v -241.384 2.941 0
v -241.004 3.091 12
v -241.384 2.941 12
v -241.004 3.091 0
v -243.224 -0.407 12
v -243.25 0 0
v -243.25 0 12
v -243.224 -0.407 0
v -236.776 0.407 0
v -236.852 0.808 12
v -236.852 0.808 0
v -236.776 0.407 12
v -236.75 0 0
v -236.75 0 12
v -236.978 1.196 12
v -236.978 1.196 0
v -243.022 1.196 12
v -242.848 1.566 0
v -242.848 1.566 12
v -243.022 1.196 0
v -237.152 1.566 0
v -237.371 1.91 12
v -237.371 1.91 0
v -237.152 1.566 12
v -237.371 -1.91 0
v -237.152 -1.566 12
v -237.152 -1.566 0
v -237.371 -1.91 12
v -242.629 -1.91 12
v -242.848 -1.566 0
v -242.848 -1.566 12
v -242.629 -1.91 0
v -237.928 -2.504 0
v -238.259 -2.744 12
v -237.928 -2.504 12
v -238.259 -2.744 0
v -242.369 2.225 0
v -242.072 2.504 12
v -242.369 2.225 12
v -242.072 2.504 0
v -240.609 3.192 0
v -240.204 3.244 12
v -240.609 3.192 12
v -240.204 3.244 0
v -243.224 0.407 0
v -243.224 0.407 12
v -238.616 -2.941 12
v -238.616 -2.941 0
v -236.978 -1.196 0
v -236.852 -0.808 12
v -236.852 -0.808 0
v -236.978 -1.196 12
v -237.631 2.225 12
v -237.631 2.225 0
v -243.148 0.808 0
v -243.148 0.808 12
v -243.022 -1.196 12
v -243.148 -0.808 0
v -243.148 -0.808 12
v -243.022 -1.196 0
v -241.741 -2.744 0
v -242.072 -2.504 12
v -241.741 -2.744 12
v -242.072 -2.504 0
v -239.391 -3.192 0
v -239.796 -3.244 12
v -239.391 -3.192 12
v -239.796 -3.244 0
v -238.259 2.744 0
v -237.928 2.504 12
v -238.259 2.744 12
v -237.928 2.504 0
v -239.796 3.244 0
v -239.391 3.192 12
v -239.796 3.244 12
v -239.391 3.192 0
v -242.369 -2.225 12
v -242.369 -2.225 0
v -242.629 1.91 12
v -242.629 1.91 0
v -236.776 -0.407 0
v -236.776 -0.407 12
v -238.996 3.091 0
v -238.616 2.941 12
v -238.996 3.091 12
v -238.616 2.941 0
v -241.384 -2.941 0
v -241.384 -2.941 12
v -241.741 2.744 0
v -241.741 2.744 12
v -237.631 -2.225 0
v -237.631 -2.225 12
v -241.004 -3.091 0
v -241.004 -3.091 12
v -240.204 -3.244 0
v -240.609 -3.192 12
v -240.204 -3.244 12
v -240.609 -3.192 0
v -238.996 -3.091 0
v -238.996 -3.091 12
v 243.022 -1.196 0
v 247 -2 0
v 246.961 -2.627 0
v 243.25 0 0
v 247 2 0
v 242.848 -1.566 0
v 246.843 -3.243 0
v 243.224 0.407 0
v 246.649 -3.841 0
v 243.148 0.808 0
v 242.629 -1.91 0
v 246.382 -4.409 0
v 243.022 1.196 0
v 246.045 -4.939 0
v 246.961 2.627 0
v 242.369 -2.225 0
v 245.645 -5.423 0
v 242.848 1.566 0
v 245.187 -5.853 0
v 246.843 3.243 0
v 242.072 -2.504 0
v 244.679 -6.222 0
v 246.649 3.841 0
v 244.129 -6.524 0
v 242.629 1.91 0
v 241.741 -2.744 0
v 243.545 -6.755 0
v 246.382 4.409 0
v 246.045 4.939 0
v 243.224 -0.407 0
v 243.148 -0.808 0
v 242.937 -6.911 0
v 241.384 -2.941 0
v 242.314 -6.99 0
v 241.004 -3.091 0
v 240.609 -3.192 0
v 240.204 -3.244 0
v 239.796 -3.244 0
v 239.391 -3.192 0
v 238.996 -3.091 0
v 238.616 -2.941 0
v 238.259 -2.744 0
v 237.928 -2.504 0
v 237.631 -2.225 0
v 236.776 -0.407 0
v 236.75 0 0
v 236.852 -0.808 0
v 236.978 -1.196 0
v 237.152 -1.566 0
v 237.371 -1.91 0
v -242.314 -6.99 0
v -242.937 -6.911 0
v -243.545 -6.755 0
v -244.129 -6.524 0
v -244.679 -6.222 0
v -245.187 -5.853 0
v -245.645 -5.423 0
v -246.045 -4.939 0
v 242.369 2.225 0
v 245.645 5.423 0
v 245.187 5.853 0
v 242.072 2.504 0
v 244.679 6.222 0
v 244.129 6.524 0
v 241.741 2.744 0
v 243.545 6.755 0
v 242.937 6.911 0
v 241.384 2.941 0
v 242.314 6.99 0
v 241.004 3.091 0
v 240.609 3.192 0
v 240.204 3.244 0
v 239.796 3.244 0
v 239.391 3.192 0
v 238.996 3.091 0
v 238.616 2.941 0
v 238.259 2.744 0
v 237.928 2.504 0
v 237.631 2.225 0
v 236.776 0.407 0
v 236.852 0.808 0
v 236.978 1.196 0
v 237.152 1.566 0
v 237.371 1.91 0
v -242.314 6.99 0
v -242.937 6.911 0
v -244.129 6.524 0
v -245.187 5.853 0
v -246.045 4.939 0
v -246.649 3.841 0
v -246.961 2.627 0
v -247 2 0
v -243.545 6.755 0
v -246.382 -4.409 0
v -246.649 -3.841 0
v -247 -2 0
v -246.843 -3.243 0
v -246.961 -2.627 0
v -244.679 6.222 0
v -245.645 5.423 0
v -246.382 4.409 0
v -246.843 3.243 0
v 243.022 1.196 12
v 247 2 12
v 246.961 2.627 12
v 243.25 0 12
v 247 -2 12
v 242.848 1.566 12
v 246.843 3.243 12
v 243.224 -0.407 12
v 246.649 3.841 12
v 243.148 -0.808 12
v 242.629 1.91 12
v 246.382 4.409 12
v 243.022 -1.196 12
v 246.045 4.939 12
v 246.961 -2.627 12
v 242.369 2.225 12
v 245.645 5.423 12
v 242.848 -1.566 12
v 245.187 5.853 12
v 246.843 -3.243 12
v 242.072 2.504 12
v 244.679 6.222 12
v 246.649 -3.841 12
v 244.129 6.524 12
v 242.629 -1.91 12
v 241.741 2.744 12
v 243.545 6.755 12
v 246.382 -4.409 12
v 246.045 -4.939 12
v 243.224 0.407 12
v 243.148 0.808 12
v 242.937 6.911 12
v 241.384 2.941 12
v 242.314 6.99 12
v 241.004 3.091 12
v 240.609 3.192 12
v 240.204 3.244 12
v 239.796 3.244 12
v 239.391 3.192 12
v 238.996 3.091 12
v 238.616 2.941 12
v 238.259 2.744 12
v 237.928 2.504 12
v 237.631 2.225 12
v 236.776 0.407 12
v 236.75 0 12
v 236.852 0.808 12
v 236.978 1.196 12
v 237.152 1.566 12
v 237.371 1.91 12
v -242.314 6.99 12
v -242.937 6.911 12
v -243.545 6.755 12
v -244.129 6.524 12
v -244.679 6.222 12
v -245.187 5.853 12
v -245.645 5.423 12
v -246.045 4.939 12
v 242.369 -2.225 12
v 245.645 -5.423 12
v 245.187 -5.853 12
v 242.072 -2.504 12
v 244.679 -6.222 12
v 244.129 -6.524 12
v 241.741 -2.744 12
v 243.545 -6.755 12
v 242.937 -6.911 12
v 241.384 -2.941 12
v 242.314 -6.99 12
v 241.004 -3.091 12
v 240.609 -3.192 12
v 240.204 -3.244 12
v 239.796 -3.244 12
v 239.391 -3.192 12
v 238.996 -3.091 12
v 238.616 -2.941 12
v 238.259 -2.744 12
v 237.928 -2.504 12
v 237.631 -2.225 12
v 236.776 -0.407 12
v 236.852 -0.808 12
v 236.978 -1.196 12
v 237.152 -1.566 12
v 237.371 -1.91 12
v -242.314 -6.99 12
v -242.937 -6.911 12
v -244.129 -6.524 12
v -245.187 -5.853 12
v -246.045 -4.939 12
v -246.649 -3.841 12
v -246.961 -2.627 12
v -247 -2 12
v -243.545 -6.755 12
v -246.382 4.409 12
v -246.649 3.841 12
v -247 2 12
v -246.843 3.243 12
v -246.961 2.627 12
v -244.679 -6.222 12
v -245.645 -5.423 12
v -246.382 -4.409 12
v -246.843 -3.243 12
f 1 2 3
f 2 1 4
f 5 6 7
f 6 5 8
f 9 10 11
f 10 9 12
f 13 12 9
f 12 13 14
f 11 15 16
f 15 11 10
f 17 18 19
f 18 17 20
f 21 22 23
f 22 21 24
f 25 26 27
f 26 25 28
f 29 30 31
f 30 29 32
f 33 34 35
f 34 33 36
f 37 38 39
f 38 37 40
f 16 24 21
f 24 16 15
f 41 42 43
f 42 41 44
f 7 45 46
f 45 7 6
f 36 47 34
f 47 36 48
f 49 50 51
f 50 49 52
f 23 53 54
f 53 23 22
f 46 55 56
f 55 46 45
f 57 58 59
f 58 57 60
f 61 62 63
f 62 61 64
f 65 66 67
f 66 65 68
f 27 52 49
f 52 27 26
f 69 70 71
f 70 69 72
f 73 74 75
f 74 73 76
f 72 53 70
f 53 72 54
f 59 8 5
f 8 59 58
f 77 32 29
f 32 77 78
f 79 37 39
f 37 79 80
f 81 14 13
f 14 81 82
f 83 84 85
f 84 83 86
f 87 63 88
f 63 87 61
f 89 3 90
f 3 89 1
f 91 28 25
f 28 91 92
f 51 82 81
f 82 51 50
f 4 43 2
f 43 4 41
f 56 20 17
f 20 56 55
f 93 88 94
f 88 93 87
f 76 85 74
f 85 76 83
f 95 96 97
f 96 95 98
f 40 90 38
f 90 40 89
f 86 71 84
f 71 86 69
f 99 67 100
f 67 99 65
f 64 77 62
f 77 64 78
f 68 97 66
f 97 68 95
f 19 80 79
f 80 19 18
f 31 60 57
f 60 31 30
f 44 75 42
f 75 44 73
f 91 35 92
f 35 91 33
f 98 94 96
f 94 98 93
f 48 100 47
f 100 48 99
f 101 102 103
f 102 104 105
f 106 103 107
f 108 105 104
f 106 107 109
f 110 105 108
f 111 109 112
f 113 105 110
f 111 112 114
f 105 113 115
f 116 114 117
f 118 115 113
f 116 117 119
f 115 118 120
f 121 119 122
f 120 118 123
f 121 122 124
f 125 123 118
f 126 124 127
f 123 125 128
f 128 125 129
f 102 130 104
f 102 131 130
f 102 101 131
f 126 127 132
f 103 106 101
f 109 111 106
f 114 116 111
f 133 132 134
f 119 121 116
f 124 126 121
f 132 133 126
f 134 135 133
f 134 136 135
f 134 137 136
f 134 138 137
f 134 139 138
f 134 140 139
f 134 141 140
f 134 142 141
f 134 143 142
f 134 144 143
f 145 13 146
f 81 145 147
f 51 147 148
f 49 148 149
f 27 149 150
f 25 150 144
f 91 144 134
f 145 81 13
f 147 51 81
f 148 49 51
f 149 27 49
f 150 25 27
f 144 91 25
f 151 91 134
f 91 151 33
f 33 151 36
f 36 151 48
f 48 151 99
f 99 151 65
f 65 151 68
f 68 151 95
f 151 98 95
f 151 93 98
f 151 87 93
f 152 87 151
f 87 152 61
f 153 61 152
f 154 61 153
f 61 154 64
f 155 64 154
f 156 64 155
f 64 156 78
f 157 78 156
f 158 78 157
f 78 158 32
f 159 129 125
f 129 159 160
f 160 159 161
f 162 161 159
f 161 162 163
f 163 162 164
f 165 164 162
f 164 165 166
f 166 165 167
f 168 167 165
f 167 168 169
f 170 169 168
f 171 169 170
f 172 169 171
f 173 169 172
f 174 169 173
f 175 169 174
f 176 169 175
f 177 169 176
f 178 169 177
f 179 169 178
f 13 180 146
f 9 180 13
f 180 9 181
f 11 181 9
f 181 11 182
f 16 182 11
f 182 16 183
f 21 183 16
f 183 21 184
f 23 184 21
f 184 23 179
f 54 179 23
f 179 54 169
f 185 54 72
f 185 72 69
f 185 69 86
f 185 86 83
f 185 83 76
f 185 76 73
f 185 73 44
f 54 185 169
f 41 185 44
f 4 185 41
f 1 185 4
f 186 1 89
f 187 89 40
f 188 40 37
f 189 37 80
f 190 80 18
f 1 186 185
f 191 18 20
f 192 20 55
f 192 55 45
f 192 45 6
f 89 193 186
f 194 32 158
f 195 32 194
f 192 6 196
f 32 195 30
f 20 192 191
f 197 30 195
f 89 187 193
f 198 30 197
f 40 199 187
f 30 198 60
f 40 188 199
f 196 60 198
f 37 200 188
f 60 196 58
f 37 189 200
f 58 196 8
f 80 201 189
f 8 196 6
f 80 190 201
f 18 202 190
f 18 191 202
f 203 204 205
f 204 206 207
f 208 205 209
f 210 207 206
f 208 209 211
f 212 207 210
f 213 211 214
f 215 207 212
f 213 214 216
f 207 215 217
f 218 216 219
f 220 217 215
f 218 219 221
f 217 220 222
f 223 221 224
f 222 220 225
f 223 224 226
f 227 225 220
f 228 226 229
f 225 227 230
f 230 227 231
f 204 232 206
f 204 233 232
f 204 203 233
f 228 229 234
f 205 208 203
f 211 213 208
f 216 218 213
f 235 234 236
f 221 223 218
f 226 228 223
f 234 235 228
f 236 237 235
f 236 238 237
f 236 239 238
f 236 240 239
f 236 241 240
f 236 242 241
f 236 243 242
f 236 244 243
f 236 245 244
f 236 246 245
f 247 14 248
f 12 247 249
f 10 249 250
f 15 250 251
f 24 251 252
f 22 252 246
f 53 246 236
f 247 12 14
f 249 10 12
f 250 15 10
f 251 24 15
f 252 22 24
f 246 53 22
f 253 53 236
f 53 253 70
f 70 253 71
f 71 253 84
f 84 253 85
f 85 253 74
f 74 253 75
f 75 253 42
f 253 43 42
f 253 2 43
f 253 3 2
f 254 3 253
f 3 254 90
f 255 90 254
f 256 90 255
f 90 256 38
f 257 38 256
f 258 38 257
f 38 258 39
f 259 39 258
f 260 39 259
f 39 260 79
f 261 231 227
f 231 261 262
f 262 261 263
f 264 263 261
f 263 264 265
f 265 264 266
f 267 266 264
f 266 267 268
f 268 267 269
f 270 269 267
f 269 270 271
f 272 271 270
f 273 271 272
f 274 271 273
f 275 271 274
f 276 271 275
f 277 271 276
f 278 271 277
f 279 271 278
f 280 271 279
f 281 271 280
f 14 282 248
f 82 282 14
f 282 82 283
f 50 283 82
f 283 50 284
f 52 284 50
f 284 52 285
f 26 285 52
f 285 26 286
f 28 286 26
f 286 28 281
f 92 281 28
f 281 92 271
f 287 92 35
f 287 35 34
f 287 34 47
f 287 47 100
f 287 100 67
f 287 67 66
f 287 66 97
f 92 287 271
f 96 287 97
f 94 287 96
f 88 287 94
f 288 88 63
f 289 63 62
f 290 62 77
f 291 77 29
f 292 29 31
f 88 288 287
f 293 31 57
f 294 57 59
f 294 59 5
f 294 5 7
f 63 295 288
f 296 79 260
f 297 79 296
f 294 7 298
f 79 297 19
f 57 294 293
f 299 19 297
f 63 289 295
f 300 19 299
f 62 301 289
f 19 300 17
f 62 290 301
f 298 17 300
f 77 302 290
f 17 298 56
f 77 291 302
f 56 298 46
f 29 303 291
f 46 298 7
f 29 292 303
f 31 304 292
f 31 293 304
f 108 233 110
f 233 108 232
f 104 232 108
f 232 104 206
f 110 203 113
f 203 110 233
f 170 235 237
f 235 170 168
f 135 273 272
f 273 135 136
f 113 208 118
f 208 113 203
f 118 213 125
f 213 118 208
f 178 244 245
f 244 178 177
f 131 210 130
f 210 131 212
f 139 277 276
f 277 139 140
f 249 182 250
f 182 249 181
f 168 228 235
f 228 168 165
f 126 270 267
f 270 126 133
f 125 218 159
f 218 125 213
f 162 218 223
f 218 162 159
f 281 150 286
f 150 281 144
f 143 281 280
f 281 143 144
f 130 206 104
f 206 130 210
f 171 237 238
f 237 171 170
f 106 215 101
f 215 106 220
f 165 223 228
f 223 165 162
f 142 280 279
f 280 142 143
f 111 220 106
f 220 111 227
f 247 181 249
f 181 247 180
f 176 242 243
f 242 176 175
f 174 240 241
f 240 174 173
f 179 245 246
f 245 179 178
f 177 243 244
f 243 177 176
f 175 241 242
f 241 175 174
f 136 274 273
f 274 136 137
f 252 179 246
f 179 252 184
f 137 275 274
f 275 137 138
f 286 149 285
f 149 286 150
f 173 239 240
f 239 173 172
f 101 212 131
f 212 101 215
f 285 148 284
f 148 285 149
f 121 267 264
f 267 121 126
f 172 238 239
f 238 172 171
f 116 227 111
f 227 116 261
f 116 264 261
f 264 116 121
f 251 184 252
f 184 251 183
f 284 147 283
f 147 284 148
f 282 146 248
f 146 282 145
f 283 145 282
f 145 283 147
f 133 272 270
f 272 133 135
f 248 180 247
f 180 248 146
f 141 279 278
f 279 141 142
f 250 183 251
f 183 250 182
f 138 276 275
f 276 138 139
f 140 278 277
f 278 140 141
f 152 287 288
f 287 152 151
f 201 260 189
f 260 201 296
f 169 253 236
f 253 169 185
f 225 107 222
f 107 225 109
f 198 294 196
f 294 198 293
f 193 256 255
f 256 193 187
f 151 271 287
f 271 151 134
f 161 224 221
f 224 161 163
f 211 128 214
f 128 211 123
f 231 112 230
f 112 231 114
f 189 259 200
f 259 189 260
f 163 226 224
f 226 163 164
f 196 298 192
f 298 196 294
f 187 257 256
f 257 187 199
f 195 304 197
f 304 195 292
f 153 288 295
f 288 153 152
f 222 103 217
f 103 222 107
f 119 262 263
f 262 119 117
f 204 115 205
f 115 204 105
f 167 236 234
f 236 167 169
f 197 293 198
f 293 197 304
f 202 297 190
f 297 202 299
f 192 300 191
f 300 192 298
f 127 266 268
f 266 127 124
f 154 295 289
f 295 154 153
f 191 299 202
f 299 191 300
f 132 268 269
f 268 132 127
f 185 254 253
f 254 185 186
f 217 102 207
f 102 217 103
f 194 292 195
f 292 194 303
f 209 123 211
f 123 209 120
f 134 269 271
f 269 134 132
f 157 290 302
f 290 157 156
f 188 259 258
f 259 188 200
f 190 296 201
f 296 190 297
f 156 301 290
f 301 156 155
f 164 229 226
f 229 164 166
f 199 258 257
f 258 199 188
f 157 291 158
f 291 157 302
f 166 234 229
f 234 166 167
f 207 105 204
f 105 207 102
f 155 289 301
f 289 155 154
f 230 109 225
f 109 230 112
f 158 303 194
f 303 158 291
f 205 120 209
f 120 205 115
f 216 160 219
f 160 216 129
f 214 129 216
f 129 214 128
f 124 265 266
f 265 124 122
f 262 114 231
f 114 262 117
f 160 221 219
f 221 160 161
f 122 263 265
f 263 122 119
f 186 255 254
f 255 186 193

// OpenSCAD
$fn = 50;


difference() {
	union() {
		hull() {
			translate(v = [-242.0000000000, 2.0000000000, 0]) {
				cylinder(h = 12, r = 5);
			}
			translate(v = [242.0000000000, 2.0000000000, 0]) {
				cylinder(h = 12, r = 5);
			}
			translate(v = [-242.0000000000, -2.0000000000, 0]) {
				cylinder(h = 12, r = 5);
			}
			translate(v = [242.0000000000, -2.0000000000, 0]) {
				cylinder(h = 12, r = 5);
			}
		}
	}
	union() {
		translate(v = [-240.0000000000, 0.0000000000, 0]) {
			cylinder(h = 12, r = 3.2500000000);
		}
		translate(v = [240.0000000000, 0.0000000000, 0]) {
			cylinder(h = 12, r = 3.2500000000);
		}
		translate(v = [-240.0000000000, 0.0000000000, 0]) {
			cylinder(h = 12, r = 1.8000000000);
		}
		translate(v = [240.0000000000, 0.0000000000, 0]) {
			cylinder(h = 12, r = 1.8000000000);
		}
		translate(v = [-240.0000000000, 0.0000000000, 0]) {
			cylinder(h = 12, r = 1.8000000000);
		}
		translate(v = [240.0000000000, 0.0000000000, 0]) {
			cylinder(h = 12, r = 1.8000000000);
		}
		translate(v = [-240.0000000000, 0.0000000000, 0]) {
			cylinder(h = 12, r = 1.8000000000);
		}
		translate(v = [240.0000000000, 0.0000000000, 0]) {
			cylinder(h = 12, r = 1.8000000000);
		}
	}
}
